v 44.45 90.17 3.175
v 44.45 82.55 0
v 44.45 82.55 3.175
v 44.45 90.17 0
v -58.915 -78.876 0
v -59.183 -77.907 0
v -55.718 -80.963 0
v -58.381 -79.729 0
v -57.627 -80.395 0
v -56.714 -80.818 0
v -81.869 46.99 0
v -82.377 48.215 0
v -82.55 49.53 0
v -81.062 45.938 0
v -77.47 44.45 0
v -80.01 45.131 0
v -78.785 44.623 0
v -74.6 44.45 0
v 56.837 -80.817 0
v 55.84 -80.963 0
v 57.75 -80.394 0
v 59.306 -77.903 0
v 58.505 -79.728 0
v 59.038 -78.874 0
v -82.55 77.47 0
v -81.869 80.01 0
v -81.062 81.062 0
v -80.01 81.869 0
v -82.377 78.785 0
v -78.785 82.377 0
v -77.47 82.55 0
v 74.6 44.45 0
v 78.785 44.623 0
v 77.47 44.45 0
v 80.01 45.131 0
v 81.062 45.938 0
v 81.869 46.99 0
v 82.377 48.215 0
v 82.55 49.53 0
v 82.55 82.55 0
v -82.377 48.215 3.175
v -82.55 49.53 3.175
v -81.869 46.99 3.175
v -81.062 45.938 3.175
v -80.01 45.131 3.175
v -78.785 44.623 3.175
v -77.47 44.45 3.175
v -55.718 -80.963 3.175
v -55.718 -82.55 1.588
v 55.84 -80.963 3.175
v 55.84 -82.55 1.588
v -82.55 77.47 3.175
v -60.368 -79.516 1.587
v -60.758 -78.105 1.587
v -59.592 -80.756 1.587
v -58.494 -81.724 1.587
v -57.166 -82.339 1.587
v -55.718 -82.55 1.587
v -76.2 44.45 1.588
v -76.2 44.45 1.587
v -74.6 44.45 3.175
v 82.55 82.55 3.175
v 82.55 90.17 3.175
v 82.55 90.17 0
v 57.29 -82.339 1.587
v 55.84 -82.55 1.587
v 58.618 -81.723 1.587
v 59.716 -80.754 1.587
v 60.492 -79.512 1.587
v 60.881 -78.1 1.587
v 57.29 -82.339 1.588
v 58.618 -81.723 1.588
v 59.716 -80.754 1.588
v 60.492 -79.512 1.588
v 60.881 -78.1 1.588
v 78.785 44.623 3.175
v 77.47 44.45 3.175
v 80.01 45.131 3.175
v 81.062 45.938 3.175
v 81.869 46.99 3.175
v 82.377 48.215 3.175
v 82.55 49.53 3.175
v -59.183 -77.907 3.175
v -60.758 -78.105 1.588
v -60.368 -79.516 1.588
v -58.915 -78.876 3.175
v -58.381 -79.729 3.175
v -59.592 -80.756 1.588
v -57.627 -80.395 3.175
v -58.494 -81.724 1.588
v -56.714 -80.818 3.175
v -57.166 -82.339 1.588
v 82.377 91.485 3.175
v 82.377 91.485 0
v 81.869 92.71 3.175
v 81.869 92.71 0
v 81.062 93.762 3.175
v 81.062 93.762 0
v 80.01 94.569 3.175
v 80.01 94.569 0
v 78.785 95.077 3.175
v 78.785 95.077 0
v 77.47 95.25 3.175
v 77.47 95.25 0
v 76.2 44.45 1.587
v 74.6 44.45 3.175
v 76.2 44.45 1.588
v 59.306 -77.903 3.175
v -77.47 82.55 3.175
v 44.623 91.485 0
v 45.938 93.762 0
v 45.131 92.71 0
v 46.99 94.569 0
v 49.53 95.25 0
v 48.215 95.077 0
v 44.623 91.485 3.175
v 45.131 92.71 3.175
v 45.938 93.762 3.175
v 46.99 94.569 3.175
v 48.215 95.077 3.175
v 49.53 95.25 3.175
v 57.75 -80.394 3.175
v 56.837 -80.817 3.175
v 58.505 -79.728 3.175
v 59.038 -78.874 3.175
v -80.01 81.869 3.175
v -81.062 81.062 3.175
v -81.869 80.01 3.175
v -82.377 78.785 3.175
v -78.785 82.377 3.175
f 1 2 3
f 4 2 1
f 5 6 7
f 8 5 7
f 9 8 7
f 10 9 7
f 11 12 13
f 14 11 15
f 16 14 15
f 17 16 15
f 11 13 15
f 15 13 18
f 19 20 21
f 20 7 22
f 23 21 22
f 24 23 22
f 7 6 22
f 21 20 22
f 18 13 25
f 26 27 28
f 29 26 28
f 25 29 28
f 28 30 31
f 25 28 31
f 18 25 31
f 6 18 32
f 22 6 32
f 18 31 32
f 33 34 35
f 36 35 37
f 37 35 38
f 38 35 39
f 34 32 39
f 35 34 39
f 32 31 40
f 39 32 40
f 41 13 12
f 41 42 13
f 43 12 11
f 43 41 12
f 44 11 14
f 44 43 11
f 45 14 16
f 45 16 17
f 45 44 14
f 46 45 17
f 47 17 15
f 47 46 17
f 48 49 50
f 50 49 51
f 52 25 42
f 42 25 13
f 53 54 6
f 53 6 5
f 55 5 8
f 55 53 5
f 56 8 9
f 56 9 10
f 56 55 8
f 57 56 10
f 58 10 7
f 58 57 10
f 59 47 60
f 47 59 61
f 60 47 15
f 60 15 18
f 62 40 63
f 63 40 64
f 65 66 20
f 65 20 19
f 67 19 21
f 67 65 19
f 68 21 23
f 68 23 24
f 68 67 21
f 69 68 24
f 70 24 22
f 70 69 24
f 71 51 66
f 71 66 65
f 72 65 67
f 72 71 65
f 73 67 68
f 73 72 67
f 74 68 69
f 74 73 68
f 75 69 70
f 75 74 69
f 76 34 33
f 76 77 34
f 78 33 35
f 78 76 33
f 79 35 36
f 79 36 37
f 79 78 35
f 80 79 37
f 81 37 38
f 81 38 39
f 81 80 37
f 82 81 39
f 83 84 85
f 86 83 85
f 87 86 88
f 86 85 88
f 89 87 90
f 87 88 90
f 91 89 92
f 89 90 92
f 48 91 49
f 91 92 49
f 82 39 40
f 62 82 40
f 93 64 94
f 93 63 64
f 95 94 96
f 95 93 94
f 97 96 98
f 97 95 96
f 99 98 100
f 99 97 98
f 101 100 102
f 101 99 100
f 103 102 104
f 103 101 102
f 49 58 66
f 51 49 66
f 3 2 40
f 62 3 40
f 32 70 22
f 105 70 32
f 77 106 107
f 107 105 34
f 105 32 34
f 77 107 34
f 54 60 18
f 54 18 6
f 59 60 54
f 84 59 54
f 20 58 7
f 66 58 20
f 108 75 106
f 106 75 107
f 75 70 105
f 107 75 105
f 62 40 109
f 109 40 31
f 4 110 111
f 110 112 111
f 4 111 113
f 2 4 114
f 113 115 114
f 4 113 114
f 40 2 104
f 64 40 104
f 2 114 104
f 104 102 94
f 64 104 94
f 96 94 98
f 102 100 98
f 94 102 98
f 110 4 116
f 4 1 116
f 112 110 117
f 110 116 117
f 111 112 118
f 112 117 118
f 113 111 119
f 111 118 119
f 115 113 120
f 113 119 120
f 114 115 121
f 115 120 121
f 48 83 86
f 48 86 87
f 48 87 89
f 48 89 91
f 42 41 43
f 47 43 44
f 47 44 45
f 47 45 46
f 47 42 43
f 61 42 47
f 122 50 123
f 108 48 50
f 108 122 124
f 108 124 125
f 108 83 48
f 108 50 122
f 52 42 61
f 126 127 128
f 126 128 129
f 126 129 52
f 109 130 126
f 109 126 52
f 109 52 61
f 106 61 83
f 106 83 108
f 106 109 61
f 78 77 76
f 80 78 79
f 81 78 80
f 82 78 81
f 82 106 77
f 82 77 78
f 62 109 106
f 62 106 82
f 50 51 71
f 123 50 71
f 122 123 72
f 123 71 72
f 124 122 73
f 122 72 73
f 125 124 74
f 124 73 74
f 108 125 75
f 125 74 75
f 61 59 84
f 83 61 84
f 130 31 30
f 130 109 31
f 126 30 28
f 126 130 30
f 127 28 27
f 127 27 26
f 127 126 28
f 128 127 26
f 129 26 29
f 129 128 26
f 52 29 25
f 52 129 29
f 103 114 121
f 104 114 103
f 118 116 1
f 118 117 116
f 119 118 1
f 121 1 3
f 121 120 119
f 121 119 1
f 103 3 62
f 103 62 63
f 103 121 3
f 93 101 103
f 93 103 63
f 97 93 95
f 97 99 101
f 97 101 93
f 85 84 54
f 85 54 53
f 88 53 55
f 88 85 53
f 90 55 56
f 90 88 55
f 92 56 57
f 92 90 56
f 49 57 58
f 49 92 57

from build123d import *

# Parameters (mm, degrees)
F2_DEPTH = 3.175
F3_W     = 38.1
F3_H     = 12.7
F4_DEPTH = 3.175
F5_R     = 5.08
F5_2_R   = 5.08
F6_SIZE  = 1.58749


# Not quite as in the source:
# - a fillet or chamfer is up to 0.001 mm smaller than in the source, because OpenCascade refuses the exact size


with BuildPart() as f2:
    # F1 (on face) → F2 (new body)
    with BuildSketch(Plane.XY):
        Polygon((82.55, 82.55), (-82.55, 82.55), (-82.55, 44.45), (-76.2, 44.45), (-60.198, -82.55), (60.325, -82.55), (76.2, 44.45), (82.55, 44.45), align=None)
    extrude(amount=F2_DEPTH)

    # F5
    f5_edges = [f2.edges().sort_by_distance(p)[0] for p in [
        (-82.55, 44.45, 1.5875),
        (-82.55, 82.55, 1.5875),
        (82.55, 44.45, 1.5875),
        (60.325, -82.55, 1.5875),
        (-60.198, -82.55, 1.5875),
    ]]
    fillet(f5_edges, radius=F5_R)

    # F6 (size 1.5875 in the source; OpenCascade refuses exactly that, so slightly less here)
    f6_edges = [f2.edges().sort_by_distance(p)[0] for p in [
        (0.061276, -82.55, 0),
        (-55.717914, -82.55, 1.5875),
        (55.840466, -82.55, 1.5875),
        (0.061276, -82.55, 3.175),
        (-59.077996, -81.28002, 0),
        (-60.758063, -78.105059, 1.5875),
        (-59.077996, -81.28002, 3.175),
        (59.202423, -81.278365, 0),
        (60.881238, -78.100096, 1.5875),
        (59.202423, -81.278365, 3.175),
    ]]
    chamfer(f6_edges, length=F6_SIZE)


with BuildPart() as f4:
    # F3 (on face) → F4 (new body)
    with BuildSketch(Plane.XY):
        with Locations((63.5, 88.9)):
            Rectangle(F3_W, F3_H)
    extrude(amount=F4_DEPTH)

    # F5#2
    f5_2_edges = [f4.edges().sort_by_distance(p)[0] for p in [
        (44.45, 95.25, 1.5875),
        (82.55, 95.25, 1.5875),
    ]]
    fillet(f5_2_edges, radius=F5_2_R)


solid = Compound([f2.part, f4.part])
